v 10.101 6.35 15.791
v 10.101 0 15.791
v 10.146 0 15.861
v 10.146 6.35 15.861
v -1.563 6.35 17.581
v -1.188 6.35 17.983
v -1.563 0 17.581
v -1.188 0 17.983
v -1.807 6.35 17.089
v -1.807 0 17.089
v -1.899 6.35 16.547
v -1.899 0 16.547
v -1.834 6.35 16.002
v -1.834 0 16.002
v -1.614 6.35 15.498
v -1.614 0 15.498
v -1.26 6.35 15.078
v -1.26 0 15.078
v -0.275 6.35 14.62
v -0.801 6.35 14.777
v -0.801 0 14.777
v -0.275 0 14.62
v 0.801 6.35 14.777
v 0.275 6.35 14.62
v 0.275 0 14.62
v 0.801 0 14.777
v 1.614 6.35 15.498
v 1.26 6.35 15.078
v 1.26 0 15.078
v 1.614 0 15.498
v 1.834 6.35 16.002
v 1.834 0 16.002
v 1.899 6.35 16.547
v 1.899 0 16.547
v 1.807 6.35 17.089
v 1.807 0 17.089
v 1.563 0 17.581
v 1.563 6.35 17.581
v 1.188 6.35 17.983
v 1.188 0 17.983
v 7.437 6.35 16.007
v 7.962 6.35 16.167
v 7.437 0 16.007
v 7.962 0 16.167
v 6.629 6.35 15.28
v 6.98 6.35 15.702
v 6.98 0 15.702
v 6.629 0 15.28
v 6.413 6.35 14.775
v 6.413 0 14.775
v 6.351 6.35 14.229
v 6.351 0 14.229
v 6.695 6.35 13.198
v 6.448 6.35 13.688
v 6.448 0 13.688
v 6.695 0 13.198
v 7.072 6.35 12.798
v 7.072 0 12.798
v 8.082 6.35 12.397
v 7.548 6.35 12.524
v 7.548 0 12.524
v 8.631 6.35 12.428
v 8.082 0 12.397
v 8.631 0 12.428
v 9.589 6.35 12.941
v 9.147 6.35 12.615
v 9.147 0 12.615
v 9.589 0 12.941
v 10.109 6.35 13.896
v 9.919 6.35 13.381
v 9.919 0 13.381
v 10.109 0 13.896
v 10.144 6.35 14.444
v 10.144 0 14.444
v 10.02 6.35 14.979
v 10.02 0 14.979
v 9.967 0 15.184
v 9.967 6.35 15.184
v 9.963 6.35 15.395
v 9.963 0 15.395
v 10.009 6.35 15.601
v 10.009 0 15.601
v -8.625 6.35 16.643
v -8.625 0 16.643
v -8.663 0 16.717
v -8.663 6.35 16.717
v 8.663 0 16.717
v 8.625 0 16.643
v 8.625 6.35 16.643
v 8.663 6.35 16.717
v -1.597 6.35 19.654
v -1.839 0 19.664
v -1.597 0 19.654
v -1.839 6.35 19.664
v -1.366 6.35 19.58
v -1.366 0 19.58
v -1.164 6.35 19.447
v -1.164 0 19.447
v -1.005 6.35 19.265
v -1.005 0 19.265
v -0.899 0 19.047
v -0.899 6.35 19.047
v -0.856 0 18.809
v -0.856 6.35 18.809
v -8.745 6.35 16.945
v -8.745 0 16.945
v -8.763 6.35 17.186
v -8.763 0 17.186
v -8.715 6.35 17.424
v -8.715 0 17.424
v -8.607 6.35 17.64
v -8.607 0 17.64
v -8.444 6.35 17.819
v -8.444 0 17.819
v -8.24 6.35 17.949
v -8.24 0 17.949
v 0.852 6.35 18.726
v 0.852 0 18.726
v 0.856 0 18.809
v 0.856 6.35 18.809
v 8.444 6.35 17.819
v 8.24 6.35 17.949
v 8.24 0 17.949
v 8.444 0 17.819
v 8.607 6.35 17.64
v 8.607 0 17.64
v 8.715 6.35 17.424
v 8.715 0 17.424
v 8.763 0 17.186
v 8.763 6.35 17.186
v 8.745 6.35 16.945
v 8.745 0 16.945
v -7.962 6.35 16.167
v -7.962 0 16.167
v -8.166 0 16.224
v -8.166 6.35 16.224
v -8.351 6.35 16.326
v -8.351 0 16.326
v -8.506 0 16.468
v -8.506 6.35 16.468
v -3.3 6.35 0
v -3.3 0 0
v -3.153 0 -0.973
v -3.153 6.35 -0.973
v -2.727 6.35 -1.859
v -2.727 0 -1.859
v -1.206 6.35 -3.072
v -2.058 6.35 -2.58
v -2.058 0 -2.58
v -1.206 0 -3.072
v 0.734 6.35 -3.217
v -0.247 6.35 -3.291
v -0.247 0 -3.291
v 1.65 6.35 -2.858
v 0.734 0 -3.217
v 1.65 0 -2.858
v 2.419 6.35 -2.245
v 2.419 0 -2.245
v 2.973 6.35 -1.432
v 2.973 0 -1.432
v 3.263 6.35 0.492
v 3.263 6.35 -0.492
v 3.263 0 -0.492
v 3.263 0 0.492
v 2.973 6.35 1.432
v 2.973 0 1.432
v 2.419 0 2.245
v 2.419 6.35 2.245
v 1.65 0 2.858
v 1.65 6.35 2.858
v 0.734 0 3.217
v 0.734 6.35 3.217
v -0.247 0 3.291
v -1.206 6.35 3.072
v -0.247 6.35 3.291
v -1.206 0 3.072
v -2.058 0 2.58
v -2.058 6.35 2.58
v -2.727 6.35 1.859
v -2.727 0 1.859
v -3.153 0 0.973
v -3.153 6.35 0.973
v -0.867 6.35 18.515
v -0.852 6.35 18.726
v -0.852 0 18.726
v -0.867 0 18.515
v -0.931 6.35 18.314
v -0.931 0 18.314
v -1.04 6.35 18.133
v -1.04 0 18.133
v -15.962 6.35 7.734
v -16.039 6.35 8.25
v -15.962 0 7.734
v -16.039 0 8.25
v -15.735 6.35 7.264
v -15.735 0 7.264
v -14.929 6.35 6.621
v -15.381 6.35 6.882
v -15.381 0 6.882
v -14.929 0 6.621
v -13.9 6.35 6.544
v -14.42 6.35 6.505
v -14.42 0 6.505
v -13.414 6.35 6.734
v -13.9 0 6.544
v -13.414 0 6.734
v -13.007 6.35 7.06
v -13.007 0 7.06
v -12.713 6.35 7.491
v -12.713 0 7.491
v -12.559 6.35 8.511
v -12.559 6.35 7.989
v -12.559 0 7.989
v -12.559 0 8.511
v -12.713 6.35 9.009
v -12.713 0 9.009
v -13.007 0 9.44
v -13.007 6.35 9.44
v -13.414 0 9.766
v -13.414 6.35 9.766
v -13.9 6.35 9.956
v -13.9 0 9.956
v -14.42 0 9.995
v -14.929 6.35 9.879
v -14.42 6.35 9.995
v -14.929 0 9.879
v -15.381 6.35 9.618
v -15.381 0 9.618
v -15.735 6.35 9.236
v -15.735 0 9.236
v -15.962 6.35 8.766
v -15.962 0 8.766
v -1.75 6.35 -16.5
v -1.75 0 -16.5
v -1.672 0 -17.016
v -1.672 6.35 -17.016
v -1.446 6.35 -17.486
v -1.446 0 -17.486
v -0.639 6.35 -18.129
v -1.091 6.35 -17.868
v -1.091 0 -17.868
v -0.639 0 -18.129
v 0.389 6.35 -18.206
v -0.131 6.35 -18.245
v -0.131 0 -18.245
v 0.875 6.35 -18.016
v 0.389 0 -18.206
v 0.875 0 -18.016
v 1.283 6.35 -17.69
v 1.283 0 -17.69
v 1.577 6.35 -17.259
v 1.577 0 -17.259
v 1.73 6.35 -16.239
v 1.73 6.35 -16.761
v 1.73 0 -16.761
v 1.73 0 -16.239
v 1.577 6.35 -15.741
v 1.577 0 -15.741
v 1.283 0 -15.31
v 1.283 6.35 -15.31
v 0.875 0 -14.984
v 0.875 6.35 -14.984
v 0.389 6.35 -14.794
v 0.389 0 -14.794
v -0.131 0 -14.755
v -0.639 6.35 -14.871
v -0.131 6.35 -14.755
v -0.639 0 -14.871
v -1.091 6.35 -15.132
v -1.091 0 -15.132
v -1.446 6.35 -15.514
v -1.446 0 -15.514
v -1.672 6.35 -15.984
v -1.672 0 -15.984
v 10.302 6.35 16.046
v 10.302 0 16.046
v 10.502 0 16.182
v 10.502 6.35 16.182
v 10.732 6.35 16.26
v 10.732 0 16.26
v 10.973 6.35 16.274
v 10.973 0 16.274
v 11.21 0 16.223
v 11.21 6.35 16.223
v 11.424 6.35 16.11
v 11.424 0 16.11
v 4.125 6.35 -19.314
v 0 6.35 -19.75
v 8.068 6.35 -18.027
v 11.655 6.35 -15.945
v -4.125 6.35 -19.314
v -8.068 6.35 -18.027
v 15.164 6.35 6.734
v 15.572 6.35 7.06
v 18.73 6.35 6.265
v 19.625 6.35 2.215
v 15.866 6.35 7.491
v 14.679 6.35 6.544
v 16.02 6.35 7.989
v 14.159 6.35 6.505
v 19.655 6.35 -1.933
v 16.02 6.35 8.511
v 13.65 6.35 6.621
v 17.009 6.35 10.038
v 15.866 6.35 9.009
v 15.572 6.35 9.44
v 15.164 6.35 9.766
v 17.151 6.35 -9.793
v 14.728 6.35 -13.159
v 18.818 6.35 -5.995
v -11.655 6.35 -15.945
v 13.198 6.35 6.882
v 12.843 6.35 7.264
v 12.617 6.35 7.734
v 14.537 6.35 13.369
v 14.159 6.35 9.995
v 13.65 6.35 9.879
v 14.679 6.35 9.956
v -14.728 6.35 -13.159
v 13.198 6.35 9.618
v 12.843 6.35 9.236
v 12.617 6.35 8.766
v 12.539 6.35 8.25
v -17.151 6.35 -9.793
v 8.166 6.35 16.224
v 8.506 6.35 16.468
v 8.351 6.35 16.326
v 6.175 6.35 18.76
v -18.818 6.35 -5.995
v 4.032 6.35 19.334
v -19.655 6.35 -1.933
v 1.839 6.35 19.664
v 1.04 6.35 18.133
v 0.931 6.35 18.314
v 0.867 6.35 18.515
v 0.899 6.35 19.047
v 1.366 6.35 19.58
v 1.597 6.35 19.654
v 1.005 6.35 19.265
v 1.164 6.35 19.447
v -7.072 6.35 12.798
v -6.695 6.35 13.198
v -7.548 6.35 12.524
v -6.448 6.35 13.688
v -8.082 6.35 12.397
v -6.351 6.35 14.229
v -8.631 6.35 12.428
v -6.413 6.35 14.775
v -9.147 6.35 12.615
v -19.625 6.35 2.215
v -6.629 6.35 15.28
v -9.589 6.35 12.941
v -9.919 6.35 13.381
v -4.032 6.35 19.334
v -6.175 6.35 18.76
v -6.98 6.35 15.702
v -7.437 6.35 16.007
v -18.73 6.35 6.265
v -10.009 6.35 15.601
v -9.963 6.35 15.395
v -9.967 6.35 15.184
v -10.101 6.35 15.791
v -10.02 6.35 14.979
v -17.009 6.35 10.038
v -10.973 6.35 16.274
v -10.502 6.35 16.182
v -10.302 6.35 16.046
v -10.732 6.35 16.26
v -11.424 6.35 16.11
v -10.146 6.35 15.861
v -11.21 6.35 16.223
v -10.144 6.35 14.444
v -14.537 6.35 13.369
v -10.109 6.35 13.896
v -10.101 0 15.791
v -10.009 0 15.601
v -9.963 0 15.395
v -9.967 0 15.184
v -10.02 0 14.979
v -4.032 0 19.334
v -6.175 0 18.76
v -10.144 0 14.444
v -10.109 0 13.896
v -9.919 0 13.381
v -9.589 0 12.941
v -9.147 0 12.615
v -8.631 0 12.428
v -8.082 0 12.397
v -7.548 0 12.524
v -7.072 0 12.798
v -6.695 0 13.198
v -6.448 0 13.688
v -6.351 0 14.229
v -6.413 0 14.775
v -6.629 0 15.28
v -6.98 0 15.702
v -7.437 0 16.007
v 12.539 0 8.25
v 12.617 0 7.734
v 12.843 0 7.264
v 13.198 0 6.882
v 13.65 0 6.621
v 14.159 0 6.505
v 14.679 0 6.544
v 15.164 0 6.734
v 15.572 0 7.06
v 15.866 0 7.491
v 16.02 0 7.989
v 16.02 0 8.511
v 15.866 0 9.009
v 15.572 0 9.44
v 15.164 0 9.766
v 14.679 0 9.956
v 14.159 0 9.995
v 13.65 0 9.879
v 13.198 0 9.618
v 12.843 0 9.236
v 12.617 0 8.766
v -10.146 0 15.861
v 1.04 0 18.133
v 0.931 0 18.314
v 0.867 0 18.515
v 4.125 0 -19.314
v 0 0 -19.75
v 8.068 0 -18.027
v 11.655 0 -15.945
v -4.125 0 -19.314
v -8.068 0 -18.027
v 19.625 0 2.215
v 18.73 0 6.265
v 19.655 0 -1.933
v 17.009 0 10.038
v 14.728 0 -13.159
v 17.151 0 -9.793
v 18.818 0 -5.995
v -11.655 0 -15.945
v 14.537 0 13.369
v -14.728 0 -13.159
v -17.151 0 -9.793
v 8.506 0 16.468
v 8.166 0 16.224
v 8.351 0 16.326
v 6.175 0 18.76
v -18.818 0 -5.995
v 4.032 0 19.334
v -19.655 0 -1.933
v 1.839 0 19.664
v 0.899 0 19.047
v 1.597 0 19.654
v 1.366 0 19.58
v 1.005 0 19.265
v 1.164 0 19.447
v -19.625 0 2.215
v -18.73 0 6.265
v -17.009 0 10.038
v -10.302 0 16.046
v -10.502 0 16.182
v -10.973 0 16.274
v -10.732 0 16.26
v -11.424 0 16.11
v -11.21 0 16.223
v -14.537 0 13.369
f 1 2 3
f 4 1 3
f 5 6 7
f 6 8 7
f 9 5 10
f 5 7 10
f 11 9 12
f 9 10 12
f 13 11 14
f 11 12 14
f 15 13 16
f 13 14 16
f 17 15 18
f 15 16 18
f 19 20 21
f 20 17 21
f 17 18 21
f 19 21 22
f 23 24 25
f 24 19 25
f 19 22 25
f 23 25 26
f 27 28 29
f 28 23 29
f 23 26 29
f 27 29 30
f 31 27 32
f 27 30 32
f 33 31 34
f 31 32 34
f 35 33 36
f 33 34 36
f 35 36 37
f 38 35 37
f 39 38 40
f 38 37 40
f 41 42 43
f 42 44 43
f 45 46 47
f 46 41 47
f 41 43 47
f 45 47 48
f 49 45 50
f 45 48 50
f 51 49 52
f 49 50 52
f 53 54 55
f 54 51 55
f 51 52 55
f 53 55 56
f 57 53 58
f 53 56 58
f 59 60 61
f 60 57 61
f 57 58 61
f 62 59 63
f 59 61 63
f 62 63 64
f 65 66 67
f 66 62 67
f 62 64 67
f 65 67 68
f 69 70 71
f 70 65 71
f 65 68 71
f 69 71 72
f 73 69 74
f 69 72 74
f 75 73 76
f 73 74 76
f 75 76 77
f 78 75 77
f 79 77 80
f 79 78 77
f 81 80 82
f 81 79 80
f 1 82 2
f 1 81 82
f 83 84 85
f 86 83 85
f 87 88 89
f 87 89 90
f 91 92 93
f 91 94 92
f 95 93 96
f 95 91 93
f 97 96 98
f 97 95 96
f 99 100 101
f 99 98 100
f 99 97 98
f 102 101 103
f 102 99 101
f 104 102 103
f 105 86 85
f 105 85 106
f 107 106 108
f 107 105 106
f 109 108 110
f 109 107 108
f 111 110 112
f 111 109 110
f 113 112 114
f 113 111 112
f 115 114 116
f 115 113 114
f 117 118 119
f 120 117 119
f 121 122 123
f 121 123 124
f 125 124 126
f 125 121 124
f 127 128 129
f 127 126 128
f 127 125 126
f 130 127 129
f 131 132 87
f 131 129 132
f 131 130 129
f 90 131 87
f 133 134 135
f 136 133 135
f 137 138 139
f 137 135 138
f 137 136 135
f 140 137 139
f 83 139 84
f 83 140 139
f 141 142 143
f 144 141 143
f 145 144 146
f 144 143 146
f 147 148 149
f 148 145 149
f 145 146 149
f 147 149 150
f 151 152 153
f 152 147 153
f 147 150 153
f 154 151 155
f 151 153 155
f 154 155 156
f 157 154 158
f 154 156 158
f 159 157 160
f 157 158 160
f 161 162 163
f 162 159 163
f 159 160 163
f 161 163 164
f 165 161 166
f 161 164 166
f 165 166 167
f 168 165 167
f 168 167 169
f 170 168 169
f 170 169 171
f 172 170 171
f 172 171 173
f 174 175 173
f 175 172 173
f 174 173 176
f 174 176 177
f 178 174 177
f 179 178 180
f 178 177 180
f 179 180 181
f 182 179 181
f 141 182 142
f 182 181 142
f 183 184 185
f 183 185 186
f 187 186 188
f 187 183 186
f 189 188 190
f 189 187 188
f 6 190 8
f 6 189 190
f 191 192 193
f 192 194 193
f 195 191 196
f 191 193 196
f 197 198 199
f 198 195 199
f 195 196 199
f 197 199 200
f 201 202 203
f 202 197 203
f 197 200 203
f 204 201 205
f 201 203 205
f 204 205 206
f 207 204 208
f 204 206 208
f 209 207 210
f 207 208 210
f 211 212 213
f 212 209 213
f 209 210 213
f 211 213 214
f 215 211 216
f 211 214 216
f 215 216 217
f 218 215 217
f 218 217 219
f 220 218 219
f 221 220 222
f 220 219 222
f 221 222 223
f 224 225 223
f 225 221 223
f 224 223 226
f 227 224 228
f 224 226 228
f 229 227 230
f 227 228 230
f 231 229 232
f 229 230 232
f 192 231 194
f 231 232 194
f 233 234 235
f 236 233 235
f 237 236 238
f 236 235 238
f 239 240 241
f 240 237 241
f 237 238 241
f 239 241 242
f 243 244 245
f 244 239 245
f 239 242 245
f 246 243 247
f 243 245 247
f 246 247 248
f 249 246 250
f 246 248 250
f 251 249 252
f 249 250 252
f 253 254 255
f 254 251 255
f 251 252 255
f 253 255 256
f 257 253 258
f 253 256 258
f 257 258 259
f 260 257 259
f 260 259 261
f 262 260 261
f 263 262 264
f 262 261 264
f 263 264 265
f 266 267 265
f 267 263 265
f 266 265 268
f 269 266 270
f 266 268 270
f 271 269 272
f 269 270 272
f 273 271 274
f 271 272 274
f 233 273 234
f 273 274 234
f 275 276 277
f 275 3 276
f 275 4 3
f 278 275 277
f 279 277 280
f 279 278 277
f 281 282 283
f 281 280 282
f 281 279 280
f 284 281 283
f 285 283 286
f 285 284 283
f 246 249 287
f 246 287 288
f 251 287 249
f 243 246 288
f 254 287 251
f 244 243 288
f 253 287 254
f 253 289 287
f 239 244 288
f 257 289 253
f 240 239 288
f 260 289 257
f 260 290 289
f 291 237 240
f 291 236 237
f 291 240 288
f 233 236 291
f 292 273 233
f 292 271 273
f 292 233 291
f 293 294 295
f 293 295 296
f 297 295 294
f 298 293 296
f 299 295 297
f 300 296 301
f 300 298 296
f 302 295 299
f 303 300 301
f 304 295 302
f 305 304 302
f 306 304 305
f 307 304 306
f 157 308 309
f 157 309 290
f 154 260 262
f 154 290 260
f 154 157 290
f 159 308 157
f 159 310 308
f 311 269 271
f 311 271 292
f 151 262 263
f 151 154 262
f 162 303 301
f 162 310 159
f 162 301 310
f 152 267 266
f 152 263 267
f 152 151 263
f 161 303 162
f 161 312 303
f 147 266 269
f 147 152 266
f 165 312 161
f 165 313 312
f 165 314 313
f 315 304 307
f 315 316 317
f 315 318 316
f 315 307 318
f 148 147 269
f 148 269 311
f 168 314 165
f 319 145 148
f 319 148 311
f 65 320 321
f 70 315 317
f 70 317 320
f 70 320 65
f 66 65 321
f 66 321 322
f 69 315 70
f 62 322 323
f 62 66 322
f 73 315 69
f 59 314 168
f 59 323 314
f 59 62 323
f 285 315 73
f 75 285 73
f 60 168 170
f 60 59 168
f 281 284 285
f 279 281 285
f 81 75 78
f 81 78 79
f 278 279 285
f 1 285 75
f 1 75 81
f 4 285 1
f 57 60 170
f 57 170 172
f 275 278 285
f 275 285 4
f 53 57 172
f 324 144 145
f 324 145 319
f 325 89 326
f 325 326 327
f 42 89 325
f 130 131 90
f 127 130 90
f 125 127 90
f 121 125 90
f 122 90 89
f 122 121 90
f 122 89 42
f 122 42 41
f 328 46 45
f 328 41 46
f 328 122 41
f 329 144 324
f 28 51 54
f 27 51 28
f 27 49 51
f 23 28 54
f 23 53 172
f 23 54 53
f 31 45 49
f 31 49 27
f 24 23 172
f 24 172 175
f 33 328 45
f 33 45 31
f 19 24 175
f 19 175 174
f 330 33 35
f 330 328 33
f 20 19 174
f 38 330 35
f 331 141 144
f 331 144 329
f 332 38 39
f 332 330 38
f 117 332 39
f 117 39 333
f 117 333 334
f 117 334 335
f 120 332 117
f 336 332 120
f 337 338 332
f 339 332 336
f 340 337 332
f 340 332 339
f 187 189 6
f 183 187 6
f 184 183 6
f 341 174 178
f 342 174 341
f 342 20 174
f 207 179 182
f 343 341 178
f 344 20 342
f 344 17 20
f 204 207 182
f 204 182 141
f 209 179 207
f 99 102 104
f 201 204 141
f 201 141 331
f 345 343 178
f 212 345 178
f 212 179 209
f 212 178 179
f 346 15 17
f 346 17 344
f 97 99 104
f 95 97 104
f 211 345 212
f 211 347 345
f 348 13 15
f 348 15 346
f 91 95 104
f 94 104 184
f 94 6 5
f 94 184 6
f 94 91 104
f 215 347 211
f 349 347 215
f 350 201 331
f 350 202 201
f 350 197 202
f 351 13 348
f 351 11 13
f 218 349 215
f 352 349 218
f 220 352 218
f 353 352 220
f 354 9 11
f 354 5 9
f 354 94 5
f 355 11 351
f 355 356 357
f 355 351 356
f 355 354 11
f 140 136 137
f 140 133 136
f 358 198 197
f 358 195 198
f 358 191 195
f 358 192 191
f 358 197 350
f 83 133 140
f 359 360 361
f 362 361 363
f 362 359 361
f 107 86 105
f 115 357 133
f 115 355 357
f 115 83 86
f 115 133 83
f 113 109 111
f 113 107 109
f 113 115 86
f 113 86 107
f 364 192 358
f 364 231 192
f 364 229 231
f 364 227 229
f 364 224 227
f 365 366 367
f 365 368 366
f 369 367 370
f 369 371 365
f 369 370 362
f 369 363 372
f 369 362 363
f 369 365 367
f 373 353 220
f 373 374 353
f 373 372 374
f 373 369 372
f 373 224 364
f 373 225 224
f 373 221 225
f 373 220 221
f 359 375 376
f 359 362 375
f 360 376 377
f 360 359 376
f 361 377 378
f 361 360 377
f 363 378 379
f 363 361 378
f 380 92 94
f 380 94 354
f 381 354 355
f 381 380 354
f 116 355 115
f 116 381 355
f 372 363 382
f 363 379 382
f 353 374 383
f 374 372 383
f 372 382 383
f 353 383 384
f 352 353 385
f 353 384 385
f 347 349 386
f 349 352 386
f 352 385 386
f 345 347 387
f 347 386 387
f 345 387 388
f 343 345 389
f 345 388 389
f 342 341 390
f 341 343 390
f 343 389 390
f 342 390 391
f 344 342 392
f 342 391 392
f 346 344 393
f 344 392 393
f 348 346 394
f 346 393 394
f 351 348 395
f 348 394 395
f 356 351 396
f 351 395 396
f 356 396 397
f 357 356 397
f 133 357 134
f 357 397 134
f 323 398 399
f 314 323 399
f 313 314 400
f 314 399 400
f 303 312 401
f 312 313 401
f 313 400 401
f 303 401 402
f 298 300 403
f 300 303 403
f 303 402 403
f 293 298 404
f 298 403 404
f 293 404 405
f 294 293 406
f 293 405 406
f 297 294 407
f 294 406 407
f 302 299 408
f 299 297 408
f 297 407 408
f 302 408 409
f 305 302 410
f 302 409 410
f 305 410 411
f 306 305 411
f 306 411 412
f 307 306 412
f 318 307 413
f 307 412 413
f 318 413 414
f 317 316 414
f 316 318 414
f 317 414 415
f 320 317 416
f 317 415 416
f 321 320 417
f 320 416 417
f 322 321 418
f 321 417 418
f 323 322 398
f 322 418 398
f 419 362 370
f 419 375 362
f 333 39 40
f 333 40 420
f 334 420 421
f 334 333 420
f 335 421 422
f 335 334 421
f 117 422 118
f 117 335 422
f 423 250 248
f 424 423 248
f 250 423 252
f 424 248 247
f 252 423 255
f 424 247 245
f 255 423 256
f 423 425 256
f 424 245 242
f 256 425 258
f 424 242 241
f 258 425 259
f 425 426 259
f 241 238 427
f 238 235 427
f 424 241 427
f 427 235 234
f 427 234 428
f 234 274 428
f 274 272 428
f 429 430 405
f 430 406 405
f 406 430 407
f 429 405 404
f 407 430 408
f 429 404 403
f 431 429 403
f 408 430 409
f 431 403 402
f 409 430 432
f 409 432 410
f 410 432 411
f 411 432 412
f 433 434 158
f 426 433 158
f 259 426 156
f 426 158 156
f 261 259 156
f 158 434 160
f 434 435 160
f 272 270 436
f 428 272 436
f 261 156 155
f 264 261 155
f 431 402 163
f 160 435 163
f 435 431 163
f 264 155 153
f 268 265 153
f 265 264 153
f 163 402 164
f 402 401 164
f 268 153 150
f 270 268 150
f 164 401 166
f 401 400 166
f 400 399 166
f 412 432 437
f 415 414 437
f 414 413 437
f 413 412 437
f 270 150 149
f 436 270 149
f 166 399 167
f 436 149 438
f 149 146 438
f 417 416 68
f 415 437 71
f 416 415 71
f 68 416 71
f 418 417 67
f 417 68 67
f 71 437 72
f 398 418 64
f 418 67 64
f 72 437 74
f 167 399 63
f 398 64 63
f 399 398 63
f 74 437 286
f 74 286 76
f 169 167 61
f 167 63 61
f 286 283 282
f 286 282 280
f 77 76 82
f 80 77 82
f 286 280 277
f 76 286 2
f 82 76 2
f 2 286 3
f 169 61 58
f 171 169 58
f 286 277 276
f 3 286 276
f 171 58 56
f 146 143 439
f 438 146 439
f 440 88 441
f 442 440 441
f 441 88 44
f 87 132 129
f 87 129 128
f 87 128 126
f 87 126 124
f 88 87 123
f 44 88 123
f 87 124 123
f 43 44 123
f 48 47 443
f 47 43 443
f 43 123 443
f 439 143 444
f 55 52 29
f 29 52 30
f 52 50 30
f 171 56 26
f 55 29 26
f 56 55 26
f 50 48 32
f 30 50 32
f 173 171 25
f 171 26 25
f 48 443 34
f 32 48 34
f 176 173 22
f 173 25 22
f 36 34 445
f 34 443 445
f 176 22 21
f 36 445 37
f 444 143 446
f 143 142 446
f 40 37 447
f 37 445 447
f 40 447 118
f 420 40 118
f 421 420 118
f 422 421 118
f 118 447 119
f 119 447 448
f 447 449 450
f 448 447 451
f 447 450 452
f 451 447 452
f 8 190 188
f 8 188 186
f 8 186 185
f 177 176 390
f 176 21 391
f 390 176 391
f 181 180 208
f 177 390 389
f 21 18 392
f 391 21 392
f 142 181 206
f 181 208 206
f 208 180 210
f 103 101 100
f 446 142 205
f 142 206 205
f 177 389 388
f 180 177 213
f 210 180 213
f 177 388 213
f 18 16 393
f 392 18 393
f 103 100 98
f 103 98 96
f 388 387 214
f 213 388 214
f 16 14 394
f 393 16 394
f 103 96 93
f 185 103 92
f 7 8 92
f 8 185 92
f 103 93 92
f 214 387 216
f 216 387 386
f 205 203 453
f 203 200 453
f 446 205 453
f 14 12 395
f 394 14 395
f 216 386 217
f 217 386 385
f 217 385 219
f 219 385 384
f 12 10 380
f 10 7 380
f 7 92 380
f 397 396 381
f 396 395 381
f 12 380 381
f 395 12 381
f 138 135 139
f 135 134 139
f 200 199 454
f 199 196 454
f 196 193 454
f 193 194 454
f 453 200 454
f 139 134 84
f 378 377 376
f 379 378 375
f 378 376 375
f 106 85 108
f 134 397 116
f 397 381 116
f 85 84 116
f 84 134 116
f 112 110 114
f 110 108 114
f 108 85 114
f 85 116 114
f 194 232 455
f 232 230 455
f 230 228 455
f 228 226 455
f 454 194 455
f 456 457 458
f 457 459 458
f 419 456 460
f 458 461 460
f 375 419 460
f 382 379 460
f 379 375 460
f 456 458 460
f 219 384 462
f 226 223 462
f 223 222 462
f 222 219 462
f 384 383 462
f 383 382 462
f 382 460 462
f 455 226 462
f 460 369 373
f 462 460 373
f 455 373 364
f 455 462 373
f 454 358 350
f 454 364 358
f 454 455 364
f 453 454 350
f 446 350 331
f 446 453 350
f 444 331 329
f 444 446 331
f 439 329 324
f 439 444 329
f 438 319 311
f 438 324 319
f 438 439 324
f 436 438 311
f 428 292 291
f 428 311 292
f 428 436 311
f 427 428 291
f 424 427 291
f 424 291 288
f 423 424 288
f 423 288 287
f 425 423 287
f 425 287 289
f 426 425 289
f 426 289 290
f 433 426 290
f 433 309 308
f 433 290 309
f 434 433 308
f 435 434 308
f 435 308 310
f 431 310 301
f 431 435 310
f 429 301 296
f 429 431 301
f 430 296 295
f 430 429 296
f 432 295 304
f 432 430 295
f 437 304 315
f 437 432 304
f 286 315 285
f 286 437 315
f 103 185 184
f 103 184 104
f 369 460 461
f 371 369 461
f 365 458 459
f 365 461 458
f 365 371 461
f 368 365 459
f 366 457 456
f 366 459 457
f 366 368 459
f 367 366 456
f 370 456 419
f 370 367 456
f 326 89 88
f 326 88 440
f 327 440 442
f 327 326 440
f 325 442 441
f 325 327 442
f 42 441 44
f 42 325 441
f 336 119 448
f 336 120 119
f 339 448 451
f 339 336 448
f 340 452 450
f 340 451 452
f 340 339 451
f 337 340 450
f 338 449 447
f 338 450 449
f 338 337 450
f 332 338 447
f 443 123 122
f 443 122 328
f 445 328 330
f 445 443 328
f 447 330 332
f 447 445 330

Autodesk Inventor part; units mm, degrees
ref_plane "YZ Plane" through (0, 0, 0) normal (1, 0, 0) x (0, 1, 0)
ref_plane "XZ Plane" through (0, 0, 0) normal (0, 1, 0) x (-1, 0, 0)
ref_plane "XY Plane" through (0, 0, 0) normal (0, 0, 1) x (1, 0, 0)
sketch "Sketch1" plane through (0, 0, 0) normal (0, 1, 0) x (-1, 0, 0)
  circle A0 centre (0, 0) radius 16.5 construction
  circle A1 centre (0, 0) radius 3.3
  arc A2 (-0.8286, 18.2098) -> (0.8286, 18.2098) centre (0, 16.5) ccw
  line L0 (0, 0) -> (9.875, 17.104) construction
  line L1 (0, 0) -> (-9.875, 17.104) construction
  line L2 (0, 0) -> (-17.104, 9.875) construction
  line L3 (0, 0) -> (17.104, 9.875) construction
  line L4 (-19.75, 0) -> (19.75, 0) construction
  circle A3 centre (0, -16.5) radius 1.75
  circle A4 centre (14.2894, 8.25) radius 1.75
  circle A5 centre (-14.2894, 8.25) radius 1.75
  arc A6 (8.3873, 16.1844) -> (9.8225, 15.3559) centre (8.25, 14.2894) ccw
  arc A7 (-9.8225, 15.3559) -> (-8.3873, 16.1844) centre (-8.25, 14.2894) ccw
  line L5 (0, 0) -> (0.75, 16.4829) construction
  line L6 (-0.75, 16.4829) -> (0, 0) construction
  line L7 (-7.592, 14.6496) -> (0, 0) construction
  line L8 (-8.891, 13.8996) -> (0, 0) construction
  line L9 (7.592, 14.6496) -> (0, 0) construction
  line L10 (8.891, 13.8996) -> (0, 0) construction
  line L11 (-8.3873, 16.1844) -> (-9.0873, 17.5352)
  line L12 (-9.8225, 15.3559) -> (-10.6422, 16.6375)
  line L13 (-0.8286, 18.2098) -> (-0.8977, 19.7296)
  line L14 (0.8286, 18.2098) -> (0.8977, 19.7296)
  line L15 (8.3873, 16.1844) -> (9.0873, 17.5352)
  line L16 (9.8225, 15.3559) -> (10.6422, 16.6375)
  arc A8 (9.0873, 17.5352) -> (0.8977, 19.7296) centre (0, 0) ccw
  arc A9 (-0.8977, 19.7296) -> (-9.0873, 17.5352) centre (0, 0) ccw
  arc A10 (-10.6422, 16.6375) -> (10.6422, 16.6375) centre (0, 0) ccw
  dimension "d1" = 33
  dimension "d2" = 6.6
  dimension "d3" = 3.8
  dimension "d4" = 30
  dimension "d5" = 60
  dimension "d6" = 60
  dimension "d7" = 30
  dimension "d8" = 3.5
  dimension "d9" = 3.5
  dimension "d10" = 3.5
  dimension "d11" = 3.8
  dimension "d12" = 3.8
  dimension "d13" = 0.75
  dimension "d14" = 0.75
  dimension "d15" = 0.75
  dimension "d16" = 0.75
  dimension "d17" = 0.75
  dimension "d18" = 0.75
  dimension "d20" = 19.75
  dimension "d21" = 19.75
  dimension "d22" = 19.75
extrude "Extrusion1" add sketch "Sketch1" along normal blind 6.35
fillet "Fillet1" radius 0.9 6 edges at (9.0873, 3.175, 17.5352) (10.6422, 3.175, 16.6375) (-0.8977, 3.175, 19.7296) (0.8977, 3.175, 19.7296) (-10.6422, 3.175, 16.6375) (-9.0873, 3.175, 17.5352)
fillet "Fillet2" radius 0.9 6 edges at (-9.8225, 3.175, 15.3559) (-0.8286, 3.175, 18.2098) (-8.3873, 3.175, 16.1844) (0.8286, 3.175, 18.2098) (8.3873, 3.175, 16.1844) (9.8225, 3.175, 15.3559)
properties part number "UpperPlate"
